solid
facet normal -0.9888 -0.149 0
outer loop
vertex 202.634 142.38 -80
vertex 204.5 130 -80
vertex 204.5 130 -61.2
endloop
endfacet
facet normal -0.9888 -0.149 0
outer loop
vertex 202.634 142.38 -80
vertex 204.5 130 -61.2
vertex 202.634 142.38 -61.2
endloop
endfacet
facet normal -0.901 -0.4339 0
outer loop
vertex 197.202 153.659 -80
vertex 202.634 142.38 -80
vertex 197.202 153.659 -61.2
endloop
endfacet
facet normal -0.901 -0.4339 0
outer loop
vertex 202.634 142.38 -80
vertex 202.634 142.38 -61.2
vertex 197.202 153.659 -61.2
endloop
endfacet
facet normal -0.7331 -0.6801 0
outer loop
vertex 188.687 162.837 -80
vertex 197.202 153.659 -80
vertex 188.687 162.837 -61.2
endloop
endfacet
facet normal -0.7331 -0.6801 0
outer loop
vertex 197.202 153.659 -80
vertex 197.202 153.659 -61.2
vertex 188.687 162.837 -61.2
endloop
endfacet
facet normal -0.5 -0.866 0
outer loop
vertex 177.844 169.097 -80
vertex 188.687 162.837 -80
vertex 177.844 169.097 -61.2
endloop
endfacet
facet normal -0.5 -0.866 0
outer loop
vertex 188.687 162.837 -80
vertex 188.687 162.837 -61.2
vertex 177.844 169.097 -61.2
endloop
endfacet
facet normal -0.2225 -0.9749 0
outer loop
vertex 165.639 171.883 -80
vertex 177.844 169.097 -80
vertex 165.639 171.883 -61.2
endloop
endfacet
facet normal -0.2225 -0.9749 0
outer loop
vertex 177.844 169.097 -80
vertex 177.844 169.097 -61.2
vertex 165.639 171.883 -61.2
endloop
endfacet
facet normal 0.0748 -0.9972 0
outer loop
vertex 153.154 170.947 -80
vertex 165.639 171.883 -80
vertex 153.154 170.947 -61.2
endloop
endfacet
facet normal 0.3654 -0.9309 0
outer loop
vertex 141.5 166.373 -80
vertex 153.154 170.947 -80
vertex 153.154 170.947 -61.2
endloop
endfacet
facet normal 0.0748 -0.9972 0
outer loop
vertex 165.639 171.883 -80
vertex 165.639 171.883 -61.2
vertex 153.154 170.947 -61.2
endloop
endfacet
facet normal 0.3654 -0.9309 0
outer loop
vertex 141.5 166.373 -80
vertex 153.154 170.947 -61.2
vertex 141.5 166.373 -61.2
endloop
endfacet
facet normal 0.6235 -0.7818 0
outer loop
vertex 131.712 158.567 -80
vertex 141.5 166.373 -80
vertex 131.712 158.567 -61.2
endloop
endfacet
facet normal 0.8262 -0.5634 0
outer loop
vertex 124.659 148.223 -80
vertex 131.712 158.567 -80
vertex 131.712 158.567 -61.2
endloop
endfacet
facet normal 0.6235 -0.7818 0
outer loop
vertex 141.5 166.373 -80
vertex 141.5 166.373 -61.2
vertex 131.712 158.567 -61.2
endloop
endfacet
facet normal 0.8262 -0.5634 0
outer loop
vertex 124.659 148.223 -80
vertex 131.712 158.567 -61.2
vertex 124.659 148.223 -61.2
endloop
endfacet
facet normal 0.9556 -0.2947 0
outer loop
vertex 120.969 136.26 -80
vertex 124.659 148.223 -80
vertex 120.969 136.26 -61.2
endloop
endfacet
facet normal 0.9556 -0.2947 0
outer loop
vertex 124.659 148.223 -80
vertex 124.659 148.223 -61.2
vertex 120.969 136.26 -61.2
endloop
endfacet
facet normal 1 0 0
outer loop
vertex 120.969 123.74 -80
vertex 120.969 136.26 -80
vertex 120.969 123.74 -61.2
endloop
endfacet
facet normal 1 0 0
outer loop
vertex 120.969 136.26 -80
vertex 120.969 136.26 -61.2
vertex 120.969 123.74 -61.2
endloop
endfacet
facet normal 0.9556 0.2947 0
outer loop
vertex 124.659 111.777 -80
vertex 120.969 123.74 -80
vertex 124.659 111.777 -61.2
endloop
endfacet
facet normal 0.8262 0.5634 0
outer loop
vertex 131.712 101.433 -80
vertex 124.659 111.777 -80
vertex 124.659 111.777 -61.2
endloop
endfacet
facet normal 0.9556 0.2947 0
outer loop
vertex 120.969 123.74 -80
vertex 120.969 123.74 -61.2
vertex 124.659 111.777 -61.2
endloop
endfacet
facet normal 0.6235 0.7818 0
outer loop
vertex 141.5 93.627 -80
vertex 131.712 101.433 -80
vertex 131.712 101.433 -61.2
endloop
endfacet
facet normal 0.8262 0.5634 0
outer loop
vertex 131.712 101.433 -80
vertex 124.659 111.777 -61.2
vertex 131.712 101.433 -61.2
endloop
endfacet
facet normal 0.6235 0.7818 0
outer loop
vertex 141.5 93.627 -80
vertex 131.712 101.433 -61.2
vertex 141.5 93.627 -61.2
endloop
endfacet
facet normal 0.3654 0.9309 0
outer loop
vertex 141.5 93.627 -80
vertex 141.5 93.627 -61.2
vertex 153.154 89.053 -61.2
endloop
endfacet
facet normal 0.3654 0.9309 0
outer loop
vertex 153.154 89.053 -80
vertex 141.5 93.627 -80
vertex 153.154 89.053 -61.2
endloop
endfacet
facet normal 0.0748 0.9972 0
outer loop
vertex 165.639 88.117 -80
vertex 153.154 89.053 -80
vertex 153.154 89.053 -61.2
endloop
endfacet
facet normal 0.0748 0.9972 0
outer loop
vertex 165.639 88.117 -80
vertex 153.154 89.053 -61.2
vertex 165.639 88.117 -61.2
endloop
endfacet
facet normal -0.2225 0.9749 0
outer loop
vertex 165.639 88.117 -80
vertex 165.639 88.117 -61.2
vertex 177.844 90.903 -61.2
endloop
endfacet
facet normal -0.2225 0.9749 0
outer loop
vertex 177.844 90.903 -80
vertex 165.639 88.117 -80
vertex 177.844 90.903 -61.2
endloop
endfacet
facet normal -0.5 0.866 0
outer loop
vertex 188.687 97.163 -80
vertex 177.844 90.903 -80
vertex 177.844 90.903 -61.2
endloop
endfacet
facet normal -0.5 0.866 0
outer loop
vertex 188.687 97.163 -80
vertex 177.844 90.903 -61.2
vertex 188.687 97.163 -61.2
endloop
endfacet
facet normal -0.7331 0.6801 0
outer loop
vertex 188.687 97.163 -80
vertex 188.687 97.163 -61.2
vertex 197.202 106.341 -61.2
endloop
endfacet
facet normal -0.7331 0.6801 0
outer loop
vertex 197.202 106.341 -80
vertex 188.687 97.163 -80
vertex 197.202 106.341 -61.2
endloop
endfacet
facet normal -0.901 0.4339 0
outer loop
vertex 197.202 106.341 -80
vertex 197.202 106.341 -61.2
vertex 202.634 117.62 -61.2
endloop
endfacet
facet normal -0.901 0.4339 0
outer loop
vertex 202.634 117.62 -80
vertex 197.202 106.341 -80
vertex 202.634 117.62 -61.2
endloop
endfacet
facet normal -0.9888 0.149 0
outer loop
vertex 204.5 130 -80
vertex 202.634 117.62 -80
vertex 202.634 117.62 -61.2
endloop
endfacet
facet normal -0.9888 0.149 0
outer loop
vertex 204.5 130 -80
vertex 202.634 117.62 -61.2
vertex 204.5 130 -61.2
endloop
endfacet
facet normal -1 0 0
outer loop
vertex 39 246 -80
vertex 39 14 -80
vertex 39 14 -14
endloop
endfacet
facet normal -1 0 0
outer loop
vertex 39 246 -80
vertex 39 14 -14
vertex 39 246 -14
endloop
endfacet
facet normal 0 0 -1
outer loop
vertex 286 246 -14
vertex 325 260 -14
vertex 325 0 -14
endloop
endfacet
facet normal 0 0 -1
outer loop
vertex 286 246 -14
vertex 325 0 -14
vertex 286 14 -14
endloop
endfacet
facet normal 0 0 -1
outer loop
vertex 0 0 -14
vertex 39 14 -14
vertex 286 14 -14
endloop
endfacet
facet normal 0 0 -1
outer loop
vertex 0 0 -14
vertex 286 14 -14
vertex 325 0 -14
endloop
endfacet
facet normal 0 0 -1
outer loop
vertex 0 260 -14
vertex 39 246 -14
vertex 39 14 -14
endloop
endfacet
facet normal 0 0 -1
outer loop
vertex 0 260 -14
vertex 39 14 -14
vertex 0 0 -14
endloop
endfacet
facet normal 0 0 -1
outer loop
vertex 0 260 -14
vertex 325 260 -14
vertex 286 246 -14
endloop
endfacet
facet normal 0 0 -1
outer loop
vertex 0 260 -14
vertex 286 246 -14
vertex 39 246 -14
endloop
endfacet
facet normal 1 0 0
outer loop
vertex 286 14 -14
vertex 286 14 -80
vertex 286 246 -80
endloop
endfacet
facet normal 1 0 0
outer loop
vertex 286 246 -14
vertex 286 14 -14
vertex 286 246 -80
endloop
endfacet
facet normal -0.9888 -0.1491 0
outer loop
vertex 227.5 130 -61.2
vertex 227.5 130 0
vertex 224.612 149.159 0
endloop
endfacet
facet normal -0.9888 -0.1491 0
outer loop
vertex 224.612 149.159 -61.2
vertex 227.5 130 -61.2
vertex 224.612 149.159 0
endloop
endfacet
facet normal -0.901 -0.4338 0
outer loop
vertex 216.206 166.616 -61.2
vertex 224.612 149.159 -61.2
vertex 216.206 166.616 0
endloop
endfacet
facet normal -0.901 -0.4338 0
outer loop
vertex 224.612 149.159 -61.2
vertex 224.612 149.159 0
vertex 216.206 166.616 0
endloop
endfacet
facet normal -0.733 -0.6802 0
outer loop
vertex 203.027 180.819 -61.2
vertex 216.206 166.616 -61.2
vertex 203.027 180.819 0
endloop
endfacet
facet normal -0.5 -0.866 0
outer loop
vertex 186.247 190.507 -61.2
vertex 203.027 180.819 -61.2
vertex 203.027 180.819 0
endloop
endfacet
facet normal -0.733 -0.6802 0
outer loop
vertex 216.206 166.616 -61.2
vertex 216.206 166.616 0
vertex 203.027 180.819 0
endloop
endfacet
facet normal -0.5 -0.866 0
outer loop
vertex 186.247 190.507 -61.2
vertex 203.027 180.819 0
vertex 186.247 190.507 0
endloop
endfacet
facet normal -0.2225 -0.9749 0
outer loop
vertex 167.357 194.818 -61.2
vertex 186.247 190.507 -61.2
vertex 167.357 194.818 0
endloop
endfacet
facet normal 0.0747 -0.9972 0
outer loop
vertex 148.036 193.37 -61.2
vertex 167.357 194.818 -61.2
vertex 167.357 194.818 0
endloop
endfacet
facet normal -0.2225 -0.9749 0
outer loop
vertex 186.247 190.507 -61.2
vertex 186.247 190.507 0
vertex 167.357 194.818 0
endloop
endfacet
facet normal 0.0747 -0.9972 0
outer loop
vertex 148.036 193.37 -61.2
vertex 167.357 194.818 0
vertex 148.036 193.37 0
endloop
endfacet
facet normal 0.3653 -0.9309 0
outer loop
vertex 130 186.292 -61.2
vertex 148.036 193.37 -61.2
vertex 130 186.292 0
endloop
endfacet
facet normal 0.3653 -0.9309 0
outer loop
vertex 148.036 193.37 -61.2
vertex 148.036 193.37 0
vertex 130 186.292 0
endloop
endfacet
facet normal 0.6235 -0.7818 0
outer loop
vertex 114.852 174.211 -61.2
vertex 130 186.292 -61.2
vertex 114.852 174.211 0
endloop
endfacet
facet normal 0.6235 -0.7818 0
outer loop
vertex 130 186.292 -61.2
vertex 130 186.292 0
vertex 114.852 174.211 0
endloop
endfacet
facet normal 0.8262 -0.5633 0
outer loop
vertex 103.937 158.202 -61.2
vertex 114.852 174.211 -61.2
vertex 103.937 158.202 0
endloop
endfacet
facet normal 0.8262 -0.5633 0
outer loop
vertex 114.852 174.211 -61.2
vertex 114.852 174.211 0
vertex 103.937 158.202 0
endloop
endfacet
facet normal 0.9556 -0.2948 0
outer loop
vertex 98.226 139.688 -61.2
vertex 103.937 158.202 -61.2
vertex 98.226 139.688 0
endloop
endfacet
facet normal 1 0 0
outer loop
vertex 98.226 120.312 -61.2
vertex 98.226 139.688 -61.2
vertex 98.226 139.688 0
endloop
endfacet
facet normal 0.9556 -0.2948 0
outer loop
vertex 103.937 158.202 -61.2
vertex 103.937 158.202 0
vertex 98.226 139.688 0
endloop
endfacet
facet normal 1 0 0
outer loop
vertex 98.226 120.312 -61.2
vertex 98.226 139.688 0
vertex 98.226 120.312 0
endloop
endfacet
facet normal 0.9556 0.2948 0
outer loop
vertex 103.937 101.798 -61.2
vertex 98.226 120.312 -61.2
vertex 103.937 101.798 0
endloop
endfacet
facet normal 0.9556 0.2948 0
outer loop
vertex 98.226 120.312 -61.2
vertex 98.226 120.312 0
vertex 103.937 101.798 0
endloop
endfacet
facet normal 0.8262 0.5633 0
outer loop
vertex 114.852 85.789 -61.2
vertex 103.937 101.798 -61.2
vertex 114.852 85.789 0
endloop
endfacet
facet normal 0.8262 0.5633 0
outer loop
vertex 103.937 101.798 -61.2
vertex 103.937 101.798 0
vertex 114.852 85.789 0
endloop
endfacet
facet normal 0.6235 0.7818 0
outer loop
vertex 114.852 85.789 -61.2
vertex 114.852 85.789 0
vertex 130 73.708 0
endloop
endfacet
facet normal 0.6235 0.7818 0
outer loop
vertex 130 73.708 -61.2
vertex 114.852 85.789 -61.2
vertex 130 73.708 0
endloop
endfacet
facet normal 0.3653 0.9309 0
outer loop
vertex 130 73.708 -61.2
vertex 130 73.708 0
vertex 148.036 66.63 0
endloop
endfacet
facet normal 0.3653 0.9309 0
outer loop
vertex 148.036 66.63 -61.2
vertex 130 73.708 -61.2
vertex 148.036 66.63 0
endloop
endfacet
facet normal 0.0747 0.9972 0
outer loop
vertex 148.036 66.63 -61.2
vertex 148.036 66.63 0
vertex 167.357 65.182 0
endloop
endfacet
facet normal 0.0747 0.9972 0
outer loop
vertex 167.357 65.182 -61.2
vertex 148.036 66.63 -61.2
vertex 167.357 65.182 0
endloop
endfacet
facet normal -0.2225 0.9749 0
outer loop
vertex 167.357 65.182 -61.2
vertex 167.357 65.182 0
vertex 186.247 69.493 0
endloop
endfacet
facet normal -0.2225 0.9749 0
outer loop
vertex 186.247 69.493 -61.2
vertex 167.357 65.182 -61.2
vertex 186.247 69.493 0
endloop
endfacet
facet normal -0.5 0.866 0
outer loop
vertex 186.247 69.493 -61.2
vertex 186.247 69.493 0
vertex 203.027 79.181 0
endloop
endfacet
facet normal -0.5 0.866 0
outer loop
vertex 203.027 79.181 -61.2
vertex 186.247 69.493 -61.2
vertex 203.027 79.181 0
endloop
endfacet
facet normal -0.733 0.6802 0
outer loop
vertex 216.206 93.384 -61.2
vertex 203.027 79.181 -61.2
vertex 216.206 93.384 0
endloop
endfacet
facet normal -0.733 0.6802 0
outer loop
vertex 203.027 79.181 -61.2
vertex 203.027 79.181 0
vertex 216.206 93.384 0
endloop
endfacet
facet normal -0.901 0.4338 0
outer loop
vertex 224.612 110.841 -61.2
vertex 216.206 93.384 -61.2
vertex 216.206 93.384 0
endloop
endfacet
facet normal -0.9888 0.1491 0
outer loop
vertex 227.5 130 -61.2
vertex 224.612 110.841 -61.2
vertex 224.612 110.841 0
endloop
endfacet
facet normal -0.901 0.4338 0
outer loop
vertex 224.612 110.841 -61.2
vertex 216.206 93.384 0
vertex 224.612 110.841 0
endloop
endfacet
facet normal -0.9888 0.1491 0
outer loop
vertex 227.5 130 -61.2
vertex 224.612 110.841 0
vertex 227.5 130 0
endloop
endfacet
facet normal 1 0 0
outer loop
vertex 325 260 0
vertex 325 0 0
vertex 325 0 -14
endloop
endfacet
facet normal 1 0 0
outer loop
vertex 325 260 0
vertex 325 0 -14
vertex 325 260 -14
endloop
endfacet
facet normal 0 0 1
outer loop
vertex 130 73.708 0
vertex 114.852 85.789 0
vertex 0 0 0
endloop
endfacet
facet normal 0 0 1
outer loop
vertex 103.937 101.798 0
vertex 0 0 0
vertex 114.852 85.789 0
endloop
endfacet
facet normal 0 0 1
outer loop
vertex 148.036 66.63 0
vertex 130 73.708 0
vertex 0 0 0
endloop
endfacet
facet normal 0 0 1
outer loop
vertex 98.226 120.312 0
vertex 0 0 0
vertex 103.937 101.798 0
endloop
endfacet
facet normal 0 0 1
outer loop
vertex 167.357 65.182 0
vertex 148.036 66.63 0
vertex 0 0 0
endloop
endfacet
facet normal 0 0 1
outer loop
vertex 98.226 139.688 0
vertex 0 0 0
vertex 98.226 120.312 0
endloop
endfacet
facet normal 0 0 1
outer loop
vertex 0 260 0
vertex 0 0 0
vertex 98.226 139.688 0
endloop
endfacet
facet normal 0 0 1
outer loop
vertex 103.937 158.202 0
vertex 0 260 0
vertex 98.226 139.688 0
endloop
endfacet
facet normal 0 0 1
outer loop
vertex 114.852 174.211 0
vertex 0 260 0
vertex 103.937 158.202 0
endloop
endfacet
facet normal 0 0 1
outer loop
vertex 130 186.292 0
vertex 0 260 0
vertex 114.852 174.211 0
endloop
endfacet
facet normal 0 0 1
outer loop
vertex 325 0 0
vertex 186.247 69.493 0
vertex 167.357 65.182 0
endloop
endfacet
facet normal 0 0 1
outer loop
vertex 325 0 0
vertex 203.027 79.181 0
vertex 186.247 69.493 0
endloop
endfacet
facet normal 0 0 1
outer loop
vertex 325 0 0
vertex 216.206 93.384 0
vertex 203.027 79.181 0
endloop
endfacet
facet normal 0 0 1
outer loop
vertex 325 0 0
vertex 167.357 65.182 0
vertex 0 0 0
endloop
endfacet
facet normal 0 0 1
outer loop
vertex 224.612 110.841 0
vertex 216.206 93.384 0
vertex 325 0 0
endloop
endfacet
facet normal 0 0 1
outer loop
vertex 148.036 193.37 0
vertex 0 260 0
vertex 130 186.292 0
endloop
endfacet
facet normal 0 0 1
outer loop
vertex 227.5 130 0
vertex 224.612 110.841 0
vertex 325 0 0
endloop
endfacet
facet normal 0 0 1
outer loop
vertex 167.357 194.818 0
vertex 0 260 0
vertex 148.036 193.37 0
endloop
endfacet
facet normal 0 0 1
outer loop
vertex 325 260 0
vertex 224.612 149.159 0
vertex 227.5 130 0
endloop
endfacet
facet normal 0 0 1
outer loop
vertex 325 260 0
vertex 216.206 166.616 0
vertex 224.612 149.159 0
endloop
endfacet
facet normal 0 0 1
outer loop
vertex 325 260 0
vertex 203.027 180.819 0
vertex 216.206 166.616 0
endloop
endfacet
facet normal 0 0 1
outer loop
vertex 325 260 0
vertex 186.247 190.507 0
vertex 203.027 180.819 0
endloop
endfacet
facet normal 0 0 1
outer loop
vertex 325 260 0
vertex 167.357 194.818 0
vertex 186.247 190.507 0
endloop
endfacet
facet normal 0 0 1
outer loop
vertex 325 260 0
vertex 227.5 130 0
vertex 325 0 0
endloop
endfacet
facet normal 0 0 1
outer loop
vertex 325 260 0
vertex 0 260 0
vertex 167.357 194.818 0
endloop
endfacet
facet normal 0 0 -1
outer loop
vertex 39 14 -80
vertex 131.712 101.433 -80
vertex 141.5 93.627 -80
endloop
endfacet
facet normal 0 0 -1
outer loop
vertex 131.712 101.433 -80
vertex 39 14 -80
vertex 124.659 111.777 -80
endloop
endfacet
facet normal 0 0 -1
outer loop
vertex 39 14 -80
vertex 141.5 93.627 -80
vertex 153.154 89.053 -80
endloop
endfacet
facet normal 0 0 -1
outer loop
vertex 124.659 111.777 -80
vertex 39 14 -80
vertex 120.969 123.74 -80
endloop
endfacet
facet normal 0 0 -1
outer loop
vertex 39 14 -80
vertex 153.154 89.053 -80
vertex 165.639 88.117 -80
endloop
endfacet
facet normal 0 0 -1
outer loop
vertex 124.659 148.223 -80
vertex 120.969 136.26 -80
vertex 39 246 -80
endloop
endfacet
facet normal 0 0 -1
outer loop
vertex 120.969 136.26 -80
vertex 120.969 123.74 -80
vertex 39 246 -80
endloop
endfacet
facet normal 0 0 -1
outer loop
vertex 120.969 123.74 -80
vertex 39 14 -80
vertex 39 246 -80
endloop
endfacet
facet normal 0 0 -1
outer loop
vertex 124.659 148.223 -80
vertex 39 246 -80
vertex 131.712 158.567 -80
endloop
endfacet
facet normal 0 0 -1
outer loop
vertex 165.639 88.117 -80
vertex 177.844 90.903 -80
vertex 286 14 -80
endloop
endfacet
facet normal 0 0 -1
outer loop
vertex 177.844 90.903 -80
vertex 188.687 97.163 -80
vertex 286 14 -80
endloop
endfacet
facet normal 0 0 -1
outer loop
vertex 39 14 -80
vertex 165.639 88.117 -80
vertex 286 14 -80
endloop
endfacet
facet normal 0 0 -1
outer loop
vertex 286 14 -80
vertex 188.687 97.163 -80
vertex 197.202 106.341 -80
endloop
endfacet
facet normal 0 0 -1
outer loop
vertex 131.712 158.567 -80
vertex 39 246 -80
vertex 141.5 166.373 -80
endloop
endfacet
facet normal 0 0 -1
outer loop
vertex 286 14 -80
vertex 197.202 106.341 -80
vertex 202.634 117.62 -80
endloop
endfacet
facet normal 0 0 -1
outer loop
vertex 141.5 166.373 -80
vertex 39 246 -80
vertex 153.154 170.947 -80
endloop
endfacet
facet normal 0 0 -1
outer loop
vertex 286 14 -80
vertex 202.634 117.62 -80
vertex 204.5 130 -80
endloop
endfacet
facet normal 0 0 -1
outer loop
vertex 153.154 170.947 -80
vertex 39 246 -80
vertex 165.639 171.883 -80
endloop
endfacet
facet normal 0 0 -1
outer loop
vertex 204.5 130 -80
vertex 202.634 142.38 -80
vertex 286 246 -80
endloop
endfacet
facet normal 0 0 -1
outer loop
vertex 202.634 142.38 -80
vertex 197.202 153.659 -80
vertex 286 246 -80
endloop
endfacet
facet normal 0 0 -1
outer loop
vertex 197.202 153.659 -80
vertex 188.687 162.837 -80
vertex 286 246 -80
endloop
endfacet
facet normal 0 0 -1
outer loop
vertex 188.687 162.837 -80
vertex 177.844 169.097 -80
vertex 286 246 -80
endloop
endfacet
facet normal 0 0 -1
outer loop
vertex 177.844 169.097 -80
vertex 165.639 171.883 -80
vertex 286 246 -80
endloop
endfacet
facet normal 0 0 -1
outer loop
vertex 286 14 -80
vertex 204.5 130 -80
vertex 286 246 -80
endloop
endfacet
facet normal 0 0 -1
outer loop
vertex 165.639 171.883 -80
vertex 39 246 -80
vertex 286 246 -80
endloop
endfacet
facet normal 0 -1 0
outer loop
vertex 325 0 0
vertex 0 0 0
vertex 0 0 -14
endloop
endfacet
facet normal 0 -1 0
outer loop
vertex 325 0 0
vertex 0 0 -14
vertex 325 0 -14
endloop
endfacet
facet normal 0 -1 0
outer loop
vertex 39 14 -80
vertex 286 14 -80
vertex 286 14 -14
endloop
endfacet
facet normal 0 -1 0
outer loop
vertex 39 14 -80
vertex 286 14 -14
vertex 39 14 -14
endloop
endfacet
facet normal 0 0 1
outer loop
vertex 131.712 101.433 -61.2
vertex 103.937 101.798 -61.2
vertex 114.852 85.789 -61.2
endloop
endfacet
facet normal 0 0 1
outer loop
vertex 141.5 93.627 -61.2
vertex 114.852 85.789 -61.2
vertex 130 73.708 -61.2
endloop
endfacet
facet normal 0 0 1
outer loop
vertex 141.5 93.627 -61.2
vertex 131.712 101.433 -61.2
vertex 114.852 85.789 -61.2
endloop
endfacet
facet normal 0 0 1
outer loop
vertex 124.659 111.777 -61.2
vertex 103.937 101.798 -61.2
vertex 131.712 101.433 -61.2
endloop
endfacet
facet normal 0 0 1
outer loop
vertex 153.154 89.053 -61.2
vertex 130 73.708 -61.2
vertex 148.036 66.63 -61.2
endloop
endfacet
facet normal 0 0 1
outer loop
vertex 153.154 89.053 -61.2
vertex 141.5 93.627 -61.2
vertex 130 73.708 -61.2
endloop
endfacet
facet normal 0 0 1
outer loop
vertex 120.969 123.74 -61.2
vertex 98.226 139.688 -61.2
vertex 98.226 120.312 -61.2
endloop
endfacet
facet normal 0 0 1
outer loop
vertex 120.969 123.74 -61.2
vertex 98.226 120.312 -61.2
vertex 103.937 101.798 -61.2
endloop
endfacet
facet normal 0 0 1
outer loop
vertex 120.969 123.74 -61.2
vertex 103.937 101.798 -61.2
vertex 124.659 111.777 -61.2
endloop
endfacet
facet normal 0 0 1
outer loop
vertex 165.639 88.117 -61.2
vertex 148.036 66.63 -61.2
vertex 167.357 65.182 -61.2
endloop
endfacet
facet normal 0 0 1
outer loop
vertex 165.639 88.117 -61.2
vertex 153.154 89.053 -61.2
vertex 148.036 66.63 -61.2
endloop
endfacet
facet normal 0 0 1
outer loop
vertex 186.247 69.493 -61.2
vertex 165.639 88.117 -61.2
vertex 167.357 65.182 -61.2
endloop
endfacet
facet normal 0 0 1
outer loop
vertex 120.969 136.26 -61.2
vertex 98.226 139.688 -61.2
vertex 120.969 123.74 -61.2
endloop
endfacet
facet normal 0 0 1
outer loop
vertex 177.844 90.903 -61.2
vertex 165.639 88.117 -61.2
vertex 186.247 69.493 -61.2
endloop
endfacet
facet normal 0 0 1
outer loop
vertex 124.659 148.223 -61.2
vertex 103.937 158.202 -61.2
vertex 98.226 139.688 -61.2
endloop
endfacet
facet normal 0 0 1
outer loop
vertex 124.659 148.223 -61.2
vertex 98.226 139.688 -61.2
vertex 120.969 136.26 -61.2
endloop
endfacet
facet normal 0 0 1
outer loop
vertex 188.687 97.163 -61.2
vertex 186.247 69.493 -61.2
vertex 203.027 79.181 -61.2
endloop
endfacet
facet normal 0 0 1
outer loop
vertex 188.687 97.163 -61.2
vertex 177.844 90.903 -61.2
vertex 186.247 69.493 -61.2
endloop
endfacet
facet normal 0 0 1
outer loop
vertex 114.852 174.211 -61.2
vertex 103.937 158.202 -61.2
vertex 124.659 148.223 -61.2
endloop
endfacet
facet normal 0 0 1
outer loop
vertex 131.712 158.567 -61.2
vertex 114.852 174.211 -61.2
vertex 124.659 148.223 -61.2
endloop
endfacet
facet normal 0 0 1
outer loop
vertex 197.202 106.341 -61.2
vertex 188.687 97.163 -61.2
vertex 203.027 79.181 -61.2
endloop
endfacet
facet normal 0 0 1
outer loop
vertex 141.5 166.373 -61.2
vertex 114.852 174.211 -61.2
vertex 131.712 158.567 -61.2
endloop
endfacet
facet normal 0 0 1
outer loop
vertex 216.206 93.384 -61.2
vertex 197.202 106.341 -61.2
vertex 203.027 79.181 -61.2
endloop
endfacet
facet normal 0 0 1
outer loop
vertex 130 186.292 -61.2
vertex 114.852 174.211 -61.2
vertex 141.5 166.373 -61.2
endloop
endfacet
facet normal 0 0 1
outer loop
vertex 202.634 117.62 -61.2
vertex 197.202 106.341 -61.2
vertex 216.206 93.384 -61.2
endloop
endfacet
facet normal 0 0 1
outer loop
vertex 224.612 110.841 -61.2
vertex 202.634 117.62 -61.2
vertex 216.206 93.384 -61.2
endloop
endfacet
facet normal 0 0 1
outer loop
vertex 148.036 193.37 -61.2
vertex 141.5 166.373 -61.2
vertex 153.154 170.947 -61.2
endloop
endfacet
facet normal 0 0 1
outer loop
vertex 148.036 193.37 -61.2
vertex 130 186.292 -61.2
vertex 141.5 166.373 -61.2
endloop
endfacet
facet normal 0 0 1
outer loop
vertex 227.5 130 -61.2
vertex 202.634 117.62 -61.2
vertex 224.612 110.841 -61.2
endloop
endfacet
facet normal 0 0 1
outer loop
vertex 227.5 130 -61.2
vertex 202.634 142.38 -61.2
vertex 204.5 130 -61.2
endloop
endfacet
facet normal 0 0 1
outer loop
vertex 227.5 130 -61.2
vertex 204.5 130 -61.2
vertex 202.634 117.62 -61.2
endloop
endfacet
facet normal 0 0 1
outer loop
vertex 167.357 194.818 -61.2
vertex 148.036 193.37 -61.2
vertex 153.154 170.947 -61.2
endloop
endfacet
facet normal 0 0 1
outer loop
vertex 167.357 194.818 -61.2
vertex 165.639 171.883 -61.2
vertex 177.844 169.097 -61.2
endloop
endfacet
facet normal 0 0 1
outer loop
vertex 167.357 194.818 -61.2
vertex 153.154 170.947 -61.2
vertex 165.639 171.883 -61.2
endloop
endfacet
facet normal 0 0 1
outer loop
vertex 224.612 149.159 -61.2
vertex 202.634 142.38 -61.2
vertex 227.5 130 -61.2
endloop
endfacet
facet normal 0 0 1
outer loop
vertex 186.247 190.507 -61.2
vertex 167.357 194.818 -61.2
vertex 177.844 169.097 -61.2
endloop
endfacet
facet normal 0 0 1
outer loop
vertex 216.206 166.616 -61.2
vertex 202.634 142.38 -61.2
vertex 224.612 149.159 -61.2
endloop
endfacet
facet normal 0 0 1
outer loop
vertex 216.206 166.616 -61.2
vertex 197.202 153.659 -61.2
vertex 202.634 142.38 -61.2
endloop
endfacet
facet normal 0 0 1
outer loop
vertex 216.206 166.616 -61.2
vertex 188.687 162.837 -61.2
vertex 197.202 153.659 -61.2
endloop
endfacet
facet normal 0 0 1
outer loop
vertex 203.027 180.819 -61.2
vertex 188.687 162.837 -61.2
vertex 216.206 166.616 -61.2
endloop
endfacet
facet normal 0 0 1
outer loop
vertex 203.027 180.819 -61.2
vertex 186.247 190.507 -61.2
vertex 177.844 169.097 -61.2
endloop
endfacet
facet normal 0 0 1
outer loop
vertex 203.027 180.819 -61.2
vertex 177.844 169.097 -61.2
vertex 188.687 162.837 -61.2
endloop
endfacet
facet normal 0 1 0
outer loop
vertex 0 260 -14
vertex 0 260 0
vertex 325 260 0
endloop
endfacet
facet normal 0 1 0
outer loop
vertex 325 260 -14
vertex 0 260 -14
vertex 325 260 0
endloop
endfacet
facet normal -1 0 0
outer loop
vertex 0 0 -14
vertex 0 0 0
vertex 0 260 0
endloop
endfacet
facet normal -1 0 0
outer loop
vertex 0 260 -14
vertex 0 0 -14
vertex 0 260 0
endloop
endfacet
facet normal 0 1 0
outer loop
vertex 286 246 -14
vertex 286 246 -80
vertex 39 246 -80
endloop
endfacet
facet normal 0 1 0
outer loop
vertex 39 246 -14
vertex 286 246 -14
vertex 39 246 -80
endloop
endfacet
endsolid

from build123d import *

# Parameters (mm, degrees)
SKETCH1_W           = 325
SKETCH1_H           = 260
BOSS_EXTRUDE1_DEPTH = 80
SKETCH2_R           = 65
CUT_EXTRUDE1_DEPTH  = 61.2
SKETCH3_R           = 42
CUT_EXTRUDE2_DEPTH  = 424.821896556
SKETCH4_W           = 325
SKETCH4_H           = 260
SKETCH4_W_2         = 247
SKETCH4_H_2         = 232
CUT_EXTRUDE3_DEPTH  = 66


with BuildPart() as part:
    # Sketch1 → Boss-Extrude1 (new body)
    with BuildSketch(Plane.XY):
        with Locations((162.5, 130)):
            Rectangle(SKETCH1_W, SKETCH1_H)
    extrude(amount=-BOSS_EXTRUDE1_DEPTH)

    # Sketch2 → Cut-Extrude1 (cut)
    with BuildSketch(Plane.XY):
        with Locations((162.5, 130)):
            Circle(SKETCH2_R)
    extrude(amount=-CUT_EXTRUDE1_DEPTH, mode=Mode.SUBTRACT)

    # Sketch3 → Cut-Extrude2 (cut, through all)
    with BuildSketch(Plane.XY):
        with Locations((162.5, 130)):
            Circle(SKETCH3_R)
    extrude(amount=-CUT_EXTRUDE2_DEPTH, mode=Mode.SUBTRACT)

    # Sketch4 → Cut-Extrude3 (cut)
    with BuildSketch(Plane(origin=(0, 0, -80), x_dir=(-1, 0, 0), z_dir=(0, 0, -1))):
        with Locations((-162.5, 130)):
            Rectangle(SKETCH4_W, SKETCH4_H)
        with Locations((-162.5, 130)):
            Rectangle(SKETCH4_W_2, SKETCH4_H_2, mode=Mode.SUBTRACT)
    extrude(amount=-CUT_EXTRUDE3_DEPTH, mode=Mode.SUBTRACT)


solid = part.part
